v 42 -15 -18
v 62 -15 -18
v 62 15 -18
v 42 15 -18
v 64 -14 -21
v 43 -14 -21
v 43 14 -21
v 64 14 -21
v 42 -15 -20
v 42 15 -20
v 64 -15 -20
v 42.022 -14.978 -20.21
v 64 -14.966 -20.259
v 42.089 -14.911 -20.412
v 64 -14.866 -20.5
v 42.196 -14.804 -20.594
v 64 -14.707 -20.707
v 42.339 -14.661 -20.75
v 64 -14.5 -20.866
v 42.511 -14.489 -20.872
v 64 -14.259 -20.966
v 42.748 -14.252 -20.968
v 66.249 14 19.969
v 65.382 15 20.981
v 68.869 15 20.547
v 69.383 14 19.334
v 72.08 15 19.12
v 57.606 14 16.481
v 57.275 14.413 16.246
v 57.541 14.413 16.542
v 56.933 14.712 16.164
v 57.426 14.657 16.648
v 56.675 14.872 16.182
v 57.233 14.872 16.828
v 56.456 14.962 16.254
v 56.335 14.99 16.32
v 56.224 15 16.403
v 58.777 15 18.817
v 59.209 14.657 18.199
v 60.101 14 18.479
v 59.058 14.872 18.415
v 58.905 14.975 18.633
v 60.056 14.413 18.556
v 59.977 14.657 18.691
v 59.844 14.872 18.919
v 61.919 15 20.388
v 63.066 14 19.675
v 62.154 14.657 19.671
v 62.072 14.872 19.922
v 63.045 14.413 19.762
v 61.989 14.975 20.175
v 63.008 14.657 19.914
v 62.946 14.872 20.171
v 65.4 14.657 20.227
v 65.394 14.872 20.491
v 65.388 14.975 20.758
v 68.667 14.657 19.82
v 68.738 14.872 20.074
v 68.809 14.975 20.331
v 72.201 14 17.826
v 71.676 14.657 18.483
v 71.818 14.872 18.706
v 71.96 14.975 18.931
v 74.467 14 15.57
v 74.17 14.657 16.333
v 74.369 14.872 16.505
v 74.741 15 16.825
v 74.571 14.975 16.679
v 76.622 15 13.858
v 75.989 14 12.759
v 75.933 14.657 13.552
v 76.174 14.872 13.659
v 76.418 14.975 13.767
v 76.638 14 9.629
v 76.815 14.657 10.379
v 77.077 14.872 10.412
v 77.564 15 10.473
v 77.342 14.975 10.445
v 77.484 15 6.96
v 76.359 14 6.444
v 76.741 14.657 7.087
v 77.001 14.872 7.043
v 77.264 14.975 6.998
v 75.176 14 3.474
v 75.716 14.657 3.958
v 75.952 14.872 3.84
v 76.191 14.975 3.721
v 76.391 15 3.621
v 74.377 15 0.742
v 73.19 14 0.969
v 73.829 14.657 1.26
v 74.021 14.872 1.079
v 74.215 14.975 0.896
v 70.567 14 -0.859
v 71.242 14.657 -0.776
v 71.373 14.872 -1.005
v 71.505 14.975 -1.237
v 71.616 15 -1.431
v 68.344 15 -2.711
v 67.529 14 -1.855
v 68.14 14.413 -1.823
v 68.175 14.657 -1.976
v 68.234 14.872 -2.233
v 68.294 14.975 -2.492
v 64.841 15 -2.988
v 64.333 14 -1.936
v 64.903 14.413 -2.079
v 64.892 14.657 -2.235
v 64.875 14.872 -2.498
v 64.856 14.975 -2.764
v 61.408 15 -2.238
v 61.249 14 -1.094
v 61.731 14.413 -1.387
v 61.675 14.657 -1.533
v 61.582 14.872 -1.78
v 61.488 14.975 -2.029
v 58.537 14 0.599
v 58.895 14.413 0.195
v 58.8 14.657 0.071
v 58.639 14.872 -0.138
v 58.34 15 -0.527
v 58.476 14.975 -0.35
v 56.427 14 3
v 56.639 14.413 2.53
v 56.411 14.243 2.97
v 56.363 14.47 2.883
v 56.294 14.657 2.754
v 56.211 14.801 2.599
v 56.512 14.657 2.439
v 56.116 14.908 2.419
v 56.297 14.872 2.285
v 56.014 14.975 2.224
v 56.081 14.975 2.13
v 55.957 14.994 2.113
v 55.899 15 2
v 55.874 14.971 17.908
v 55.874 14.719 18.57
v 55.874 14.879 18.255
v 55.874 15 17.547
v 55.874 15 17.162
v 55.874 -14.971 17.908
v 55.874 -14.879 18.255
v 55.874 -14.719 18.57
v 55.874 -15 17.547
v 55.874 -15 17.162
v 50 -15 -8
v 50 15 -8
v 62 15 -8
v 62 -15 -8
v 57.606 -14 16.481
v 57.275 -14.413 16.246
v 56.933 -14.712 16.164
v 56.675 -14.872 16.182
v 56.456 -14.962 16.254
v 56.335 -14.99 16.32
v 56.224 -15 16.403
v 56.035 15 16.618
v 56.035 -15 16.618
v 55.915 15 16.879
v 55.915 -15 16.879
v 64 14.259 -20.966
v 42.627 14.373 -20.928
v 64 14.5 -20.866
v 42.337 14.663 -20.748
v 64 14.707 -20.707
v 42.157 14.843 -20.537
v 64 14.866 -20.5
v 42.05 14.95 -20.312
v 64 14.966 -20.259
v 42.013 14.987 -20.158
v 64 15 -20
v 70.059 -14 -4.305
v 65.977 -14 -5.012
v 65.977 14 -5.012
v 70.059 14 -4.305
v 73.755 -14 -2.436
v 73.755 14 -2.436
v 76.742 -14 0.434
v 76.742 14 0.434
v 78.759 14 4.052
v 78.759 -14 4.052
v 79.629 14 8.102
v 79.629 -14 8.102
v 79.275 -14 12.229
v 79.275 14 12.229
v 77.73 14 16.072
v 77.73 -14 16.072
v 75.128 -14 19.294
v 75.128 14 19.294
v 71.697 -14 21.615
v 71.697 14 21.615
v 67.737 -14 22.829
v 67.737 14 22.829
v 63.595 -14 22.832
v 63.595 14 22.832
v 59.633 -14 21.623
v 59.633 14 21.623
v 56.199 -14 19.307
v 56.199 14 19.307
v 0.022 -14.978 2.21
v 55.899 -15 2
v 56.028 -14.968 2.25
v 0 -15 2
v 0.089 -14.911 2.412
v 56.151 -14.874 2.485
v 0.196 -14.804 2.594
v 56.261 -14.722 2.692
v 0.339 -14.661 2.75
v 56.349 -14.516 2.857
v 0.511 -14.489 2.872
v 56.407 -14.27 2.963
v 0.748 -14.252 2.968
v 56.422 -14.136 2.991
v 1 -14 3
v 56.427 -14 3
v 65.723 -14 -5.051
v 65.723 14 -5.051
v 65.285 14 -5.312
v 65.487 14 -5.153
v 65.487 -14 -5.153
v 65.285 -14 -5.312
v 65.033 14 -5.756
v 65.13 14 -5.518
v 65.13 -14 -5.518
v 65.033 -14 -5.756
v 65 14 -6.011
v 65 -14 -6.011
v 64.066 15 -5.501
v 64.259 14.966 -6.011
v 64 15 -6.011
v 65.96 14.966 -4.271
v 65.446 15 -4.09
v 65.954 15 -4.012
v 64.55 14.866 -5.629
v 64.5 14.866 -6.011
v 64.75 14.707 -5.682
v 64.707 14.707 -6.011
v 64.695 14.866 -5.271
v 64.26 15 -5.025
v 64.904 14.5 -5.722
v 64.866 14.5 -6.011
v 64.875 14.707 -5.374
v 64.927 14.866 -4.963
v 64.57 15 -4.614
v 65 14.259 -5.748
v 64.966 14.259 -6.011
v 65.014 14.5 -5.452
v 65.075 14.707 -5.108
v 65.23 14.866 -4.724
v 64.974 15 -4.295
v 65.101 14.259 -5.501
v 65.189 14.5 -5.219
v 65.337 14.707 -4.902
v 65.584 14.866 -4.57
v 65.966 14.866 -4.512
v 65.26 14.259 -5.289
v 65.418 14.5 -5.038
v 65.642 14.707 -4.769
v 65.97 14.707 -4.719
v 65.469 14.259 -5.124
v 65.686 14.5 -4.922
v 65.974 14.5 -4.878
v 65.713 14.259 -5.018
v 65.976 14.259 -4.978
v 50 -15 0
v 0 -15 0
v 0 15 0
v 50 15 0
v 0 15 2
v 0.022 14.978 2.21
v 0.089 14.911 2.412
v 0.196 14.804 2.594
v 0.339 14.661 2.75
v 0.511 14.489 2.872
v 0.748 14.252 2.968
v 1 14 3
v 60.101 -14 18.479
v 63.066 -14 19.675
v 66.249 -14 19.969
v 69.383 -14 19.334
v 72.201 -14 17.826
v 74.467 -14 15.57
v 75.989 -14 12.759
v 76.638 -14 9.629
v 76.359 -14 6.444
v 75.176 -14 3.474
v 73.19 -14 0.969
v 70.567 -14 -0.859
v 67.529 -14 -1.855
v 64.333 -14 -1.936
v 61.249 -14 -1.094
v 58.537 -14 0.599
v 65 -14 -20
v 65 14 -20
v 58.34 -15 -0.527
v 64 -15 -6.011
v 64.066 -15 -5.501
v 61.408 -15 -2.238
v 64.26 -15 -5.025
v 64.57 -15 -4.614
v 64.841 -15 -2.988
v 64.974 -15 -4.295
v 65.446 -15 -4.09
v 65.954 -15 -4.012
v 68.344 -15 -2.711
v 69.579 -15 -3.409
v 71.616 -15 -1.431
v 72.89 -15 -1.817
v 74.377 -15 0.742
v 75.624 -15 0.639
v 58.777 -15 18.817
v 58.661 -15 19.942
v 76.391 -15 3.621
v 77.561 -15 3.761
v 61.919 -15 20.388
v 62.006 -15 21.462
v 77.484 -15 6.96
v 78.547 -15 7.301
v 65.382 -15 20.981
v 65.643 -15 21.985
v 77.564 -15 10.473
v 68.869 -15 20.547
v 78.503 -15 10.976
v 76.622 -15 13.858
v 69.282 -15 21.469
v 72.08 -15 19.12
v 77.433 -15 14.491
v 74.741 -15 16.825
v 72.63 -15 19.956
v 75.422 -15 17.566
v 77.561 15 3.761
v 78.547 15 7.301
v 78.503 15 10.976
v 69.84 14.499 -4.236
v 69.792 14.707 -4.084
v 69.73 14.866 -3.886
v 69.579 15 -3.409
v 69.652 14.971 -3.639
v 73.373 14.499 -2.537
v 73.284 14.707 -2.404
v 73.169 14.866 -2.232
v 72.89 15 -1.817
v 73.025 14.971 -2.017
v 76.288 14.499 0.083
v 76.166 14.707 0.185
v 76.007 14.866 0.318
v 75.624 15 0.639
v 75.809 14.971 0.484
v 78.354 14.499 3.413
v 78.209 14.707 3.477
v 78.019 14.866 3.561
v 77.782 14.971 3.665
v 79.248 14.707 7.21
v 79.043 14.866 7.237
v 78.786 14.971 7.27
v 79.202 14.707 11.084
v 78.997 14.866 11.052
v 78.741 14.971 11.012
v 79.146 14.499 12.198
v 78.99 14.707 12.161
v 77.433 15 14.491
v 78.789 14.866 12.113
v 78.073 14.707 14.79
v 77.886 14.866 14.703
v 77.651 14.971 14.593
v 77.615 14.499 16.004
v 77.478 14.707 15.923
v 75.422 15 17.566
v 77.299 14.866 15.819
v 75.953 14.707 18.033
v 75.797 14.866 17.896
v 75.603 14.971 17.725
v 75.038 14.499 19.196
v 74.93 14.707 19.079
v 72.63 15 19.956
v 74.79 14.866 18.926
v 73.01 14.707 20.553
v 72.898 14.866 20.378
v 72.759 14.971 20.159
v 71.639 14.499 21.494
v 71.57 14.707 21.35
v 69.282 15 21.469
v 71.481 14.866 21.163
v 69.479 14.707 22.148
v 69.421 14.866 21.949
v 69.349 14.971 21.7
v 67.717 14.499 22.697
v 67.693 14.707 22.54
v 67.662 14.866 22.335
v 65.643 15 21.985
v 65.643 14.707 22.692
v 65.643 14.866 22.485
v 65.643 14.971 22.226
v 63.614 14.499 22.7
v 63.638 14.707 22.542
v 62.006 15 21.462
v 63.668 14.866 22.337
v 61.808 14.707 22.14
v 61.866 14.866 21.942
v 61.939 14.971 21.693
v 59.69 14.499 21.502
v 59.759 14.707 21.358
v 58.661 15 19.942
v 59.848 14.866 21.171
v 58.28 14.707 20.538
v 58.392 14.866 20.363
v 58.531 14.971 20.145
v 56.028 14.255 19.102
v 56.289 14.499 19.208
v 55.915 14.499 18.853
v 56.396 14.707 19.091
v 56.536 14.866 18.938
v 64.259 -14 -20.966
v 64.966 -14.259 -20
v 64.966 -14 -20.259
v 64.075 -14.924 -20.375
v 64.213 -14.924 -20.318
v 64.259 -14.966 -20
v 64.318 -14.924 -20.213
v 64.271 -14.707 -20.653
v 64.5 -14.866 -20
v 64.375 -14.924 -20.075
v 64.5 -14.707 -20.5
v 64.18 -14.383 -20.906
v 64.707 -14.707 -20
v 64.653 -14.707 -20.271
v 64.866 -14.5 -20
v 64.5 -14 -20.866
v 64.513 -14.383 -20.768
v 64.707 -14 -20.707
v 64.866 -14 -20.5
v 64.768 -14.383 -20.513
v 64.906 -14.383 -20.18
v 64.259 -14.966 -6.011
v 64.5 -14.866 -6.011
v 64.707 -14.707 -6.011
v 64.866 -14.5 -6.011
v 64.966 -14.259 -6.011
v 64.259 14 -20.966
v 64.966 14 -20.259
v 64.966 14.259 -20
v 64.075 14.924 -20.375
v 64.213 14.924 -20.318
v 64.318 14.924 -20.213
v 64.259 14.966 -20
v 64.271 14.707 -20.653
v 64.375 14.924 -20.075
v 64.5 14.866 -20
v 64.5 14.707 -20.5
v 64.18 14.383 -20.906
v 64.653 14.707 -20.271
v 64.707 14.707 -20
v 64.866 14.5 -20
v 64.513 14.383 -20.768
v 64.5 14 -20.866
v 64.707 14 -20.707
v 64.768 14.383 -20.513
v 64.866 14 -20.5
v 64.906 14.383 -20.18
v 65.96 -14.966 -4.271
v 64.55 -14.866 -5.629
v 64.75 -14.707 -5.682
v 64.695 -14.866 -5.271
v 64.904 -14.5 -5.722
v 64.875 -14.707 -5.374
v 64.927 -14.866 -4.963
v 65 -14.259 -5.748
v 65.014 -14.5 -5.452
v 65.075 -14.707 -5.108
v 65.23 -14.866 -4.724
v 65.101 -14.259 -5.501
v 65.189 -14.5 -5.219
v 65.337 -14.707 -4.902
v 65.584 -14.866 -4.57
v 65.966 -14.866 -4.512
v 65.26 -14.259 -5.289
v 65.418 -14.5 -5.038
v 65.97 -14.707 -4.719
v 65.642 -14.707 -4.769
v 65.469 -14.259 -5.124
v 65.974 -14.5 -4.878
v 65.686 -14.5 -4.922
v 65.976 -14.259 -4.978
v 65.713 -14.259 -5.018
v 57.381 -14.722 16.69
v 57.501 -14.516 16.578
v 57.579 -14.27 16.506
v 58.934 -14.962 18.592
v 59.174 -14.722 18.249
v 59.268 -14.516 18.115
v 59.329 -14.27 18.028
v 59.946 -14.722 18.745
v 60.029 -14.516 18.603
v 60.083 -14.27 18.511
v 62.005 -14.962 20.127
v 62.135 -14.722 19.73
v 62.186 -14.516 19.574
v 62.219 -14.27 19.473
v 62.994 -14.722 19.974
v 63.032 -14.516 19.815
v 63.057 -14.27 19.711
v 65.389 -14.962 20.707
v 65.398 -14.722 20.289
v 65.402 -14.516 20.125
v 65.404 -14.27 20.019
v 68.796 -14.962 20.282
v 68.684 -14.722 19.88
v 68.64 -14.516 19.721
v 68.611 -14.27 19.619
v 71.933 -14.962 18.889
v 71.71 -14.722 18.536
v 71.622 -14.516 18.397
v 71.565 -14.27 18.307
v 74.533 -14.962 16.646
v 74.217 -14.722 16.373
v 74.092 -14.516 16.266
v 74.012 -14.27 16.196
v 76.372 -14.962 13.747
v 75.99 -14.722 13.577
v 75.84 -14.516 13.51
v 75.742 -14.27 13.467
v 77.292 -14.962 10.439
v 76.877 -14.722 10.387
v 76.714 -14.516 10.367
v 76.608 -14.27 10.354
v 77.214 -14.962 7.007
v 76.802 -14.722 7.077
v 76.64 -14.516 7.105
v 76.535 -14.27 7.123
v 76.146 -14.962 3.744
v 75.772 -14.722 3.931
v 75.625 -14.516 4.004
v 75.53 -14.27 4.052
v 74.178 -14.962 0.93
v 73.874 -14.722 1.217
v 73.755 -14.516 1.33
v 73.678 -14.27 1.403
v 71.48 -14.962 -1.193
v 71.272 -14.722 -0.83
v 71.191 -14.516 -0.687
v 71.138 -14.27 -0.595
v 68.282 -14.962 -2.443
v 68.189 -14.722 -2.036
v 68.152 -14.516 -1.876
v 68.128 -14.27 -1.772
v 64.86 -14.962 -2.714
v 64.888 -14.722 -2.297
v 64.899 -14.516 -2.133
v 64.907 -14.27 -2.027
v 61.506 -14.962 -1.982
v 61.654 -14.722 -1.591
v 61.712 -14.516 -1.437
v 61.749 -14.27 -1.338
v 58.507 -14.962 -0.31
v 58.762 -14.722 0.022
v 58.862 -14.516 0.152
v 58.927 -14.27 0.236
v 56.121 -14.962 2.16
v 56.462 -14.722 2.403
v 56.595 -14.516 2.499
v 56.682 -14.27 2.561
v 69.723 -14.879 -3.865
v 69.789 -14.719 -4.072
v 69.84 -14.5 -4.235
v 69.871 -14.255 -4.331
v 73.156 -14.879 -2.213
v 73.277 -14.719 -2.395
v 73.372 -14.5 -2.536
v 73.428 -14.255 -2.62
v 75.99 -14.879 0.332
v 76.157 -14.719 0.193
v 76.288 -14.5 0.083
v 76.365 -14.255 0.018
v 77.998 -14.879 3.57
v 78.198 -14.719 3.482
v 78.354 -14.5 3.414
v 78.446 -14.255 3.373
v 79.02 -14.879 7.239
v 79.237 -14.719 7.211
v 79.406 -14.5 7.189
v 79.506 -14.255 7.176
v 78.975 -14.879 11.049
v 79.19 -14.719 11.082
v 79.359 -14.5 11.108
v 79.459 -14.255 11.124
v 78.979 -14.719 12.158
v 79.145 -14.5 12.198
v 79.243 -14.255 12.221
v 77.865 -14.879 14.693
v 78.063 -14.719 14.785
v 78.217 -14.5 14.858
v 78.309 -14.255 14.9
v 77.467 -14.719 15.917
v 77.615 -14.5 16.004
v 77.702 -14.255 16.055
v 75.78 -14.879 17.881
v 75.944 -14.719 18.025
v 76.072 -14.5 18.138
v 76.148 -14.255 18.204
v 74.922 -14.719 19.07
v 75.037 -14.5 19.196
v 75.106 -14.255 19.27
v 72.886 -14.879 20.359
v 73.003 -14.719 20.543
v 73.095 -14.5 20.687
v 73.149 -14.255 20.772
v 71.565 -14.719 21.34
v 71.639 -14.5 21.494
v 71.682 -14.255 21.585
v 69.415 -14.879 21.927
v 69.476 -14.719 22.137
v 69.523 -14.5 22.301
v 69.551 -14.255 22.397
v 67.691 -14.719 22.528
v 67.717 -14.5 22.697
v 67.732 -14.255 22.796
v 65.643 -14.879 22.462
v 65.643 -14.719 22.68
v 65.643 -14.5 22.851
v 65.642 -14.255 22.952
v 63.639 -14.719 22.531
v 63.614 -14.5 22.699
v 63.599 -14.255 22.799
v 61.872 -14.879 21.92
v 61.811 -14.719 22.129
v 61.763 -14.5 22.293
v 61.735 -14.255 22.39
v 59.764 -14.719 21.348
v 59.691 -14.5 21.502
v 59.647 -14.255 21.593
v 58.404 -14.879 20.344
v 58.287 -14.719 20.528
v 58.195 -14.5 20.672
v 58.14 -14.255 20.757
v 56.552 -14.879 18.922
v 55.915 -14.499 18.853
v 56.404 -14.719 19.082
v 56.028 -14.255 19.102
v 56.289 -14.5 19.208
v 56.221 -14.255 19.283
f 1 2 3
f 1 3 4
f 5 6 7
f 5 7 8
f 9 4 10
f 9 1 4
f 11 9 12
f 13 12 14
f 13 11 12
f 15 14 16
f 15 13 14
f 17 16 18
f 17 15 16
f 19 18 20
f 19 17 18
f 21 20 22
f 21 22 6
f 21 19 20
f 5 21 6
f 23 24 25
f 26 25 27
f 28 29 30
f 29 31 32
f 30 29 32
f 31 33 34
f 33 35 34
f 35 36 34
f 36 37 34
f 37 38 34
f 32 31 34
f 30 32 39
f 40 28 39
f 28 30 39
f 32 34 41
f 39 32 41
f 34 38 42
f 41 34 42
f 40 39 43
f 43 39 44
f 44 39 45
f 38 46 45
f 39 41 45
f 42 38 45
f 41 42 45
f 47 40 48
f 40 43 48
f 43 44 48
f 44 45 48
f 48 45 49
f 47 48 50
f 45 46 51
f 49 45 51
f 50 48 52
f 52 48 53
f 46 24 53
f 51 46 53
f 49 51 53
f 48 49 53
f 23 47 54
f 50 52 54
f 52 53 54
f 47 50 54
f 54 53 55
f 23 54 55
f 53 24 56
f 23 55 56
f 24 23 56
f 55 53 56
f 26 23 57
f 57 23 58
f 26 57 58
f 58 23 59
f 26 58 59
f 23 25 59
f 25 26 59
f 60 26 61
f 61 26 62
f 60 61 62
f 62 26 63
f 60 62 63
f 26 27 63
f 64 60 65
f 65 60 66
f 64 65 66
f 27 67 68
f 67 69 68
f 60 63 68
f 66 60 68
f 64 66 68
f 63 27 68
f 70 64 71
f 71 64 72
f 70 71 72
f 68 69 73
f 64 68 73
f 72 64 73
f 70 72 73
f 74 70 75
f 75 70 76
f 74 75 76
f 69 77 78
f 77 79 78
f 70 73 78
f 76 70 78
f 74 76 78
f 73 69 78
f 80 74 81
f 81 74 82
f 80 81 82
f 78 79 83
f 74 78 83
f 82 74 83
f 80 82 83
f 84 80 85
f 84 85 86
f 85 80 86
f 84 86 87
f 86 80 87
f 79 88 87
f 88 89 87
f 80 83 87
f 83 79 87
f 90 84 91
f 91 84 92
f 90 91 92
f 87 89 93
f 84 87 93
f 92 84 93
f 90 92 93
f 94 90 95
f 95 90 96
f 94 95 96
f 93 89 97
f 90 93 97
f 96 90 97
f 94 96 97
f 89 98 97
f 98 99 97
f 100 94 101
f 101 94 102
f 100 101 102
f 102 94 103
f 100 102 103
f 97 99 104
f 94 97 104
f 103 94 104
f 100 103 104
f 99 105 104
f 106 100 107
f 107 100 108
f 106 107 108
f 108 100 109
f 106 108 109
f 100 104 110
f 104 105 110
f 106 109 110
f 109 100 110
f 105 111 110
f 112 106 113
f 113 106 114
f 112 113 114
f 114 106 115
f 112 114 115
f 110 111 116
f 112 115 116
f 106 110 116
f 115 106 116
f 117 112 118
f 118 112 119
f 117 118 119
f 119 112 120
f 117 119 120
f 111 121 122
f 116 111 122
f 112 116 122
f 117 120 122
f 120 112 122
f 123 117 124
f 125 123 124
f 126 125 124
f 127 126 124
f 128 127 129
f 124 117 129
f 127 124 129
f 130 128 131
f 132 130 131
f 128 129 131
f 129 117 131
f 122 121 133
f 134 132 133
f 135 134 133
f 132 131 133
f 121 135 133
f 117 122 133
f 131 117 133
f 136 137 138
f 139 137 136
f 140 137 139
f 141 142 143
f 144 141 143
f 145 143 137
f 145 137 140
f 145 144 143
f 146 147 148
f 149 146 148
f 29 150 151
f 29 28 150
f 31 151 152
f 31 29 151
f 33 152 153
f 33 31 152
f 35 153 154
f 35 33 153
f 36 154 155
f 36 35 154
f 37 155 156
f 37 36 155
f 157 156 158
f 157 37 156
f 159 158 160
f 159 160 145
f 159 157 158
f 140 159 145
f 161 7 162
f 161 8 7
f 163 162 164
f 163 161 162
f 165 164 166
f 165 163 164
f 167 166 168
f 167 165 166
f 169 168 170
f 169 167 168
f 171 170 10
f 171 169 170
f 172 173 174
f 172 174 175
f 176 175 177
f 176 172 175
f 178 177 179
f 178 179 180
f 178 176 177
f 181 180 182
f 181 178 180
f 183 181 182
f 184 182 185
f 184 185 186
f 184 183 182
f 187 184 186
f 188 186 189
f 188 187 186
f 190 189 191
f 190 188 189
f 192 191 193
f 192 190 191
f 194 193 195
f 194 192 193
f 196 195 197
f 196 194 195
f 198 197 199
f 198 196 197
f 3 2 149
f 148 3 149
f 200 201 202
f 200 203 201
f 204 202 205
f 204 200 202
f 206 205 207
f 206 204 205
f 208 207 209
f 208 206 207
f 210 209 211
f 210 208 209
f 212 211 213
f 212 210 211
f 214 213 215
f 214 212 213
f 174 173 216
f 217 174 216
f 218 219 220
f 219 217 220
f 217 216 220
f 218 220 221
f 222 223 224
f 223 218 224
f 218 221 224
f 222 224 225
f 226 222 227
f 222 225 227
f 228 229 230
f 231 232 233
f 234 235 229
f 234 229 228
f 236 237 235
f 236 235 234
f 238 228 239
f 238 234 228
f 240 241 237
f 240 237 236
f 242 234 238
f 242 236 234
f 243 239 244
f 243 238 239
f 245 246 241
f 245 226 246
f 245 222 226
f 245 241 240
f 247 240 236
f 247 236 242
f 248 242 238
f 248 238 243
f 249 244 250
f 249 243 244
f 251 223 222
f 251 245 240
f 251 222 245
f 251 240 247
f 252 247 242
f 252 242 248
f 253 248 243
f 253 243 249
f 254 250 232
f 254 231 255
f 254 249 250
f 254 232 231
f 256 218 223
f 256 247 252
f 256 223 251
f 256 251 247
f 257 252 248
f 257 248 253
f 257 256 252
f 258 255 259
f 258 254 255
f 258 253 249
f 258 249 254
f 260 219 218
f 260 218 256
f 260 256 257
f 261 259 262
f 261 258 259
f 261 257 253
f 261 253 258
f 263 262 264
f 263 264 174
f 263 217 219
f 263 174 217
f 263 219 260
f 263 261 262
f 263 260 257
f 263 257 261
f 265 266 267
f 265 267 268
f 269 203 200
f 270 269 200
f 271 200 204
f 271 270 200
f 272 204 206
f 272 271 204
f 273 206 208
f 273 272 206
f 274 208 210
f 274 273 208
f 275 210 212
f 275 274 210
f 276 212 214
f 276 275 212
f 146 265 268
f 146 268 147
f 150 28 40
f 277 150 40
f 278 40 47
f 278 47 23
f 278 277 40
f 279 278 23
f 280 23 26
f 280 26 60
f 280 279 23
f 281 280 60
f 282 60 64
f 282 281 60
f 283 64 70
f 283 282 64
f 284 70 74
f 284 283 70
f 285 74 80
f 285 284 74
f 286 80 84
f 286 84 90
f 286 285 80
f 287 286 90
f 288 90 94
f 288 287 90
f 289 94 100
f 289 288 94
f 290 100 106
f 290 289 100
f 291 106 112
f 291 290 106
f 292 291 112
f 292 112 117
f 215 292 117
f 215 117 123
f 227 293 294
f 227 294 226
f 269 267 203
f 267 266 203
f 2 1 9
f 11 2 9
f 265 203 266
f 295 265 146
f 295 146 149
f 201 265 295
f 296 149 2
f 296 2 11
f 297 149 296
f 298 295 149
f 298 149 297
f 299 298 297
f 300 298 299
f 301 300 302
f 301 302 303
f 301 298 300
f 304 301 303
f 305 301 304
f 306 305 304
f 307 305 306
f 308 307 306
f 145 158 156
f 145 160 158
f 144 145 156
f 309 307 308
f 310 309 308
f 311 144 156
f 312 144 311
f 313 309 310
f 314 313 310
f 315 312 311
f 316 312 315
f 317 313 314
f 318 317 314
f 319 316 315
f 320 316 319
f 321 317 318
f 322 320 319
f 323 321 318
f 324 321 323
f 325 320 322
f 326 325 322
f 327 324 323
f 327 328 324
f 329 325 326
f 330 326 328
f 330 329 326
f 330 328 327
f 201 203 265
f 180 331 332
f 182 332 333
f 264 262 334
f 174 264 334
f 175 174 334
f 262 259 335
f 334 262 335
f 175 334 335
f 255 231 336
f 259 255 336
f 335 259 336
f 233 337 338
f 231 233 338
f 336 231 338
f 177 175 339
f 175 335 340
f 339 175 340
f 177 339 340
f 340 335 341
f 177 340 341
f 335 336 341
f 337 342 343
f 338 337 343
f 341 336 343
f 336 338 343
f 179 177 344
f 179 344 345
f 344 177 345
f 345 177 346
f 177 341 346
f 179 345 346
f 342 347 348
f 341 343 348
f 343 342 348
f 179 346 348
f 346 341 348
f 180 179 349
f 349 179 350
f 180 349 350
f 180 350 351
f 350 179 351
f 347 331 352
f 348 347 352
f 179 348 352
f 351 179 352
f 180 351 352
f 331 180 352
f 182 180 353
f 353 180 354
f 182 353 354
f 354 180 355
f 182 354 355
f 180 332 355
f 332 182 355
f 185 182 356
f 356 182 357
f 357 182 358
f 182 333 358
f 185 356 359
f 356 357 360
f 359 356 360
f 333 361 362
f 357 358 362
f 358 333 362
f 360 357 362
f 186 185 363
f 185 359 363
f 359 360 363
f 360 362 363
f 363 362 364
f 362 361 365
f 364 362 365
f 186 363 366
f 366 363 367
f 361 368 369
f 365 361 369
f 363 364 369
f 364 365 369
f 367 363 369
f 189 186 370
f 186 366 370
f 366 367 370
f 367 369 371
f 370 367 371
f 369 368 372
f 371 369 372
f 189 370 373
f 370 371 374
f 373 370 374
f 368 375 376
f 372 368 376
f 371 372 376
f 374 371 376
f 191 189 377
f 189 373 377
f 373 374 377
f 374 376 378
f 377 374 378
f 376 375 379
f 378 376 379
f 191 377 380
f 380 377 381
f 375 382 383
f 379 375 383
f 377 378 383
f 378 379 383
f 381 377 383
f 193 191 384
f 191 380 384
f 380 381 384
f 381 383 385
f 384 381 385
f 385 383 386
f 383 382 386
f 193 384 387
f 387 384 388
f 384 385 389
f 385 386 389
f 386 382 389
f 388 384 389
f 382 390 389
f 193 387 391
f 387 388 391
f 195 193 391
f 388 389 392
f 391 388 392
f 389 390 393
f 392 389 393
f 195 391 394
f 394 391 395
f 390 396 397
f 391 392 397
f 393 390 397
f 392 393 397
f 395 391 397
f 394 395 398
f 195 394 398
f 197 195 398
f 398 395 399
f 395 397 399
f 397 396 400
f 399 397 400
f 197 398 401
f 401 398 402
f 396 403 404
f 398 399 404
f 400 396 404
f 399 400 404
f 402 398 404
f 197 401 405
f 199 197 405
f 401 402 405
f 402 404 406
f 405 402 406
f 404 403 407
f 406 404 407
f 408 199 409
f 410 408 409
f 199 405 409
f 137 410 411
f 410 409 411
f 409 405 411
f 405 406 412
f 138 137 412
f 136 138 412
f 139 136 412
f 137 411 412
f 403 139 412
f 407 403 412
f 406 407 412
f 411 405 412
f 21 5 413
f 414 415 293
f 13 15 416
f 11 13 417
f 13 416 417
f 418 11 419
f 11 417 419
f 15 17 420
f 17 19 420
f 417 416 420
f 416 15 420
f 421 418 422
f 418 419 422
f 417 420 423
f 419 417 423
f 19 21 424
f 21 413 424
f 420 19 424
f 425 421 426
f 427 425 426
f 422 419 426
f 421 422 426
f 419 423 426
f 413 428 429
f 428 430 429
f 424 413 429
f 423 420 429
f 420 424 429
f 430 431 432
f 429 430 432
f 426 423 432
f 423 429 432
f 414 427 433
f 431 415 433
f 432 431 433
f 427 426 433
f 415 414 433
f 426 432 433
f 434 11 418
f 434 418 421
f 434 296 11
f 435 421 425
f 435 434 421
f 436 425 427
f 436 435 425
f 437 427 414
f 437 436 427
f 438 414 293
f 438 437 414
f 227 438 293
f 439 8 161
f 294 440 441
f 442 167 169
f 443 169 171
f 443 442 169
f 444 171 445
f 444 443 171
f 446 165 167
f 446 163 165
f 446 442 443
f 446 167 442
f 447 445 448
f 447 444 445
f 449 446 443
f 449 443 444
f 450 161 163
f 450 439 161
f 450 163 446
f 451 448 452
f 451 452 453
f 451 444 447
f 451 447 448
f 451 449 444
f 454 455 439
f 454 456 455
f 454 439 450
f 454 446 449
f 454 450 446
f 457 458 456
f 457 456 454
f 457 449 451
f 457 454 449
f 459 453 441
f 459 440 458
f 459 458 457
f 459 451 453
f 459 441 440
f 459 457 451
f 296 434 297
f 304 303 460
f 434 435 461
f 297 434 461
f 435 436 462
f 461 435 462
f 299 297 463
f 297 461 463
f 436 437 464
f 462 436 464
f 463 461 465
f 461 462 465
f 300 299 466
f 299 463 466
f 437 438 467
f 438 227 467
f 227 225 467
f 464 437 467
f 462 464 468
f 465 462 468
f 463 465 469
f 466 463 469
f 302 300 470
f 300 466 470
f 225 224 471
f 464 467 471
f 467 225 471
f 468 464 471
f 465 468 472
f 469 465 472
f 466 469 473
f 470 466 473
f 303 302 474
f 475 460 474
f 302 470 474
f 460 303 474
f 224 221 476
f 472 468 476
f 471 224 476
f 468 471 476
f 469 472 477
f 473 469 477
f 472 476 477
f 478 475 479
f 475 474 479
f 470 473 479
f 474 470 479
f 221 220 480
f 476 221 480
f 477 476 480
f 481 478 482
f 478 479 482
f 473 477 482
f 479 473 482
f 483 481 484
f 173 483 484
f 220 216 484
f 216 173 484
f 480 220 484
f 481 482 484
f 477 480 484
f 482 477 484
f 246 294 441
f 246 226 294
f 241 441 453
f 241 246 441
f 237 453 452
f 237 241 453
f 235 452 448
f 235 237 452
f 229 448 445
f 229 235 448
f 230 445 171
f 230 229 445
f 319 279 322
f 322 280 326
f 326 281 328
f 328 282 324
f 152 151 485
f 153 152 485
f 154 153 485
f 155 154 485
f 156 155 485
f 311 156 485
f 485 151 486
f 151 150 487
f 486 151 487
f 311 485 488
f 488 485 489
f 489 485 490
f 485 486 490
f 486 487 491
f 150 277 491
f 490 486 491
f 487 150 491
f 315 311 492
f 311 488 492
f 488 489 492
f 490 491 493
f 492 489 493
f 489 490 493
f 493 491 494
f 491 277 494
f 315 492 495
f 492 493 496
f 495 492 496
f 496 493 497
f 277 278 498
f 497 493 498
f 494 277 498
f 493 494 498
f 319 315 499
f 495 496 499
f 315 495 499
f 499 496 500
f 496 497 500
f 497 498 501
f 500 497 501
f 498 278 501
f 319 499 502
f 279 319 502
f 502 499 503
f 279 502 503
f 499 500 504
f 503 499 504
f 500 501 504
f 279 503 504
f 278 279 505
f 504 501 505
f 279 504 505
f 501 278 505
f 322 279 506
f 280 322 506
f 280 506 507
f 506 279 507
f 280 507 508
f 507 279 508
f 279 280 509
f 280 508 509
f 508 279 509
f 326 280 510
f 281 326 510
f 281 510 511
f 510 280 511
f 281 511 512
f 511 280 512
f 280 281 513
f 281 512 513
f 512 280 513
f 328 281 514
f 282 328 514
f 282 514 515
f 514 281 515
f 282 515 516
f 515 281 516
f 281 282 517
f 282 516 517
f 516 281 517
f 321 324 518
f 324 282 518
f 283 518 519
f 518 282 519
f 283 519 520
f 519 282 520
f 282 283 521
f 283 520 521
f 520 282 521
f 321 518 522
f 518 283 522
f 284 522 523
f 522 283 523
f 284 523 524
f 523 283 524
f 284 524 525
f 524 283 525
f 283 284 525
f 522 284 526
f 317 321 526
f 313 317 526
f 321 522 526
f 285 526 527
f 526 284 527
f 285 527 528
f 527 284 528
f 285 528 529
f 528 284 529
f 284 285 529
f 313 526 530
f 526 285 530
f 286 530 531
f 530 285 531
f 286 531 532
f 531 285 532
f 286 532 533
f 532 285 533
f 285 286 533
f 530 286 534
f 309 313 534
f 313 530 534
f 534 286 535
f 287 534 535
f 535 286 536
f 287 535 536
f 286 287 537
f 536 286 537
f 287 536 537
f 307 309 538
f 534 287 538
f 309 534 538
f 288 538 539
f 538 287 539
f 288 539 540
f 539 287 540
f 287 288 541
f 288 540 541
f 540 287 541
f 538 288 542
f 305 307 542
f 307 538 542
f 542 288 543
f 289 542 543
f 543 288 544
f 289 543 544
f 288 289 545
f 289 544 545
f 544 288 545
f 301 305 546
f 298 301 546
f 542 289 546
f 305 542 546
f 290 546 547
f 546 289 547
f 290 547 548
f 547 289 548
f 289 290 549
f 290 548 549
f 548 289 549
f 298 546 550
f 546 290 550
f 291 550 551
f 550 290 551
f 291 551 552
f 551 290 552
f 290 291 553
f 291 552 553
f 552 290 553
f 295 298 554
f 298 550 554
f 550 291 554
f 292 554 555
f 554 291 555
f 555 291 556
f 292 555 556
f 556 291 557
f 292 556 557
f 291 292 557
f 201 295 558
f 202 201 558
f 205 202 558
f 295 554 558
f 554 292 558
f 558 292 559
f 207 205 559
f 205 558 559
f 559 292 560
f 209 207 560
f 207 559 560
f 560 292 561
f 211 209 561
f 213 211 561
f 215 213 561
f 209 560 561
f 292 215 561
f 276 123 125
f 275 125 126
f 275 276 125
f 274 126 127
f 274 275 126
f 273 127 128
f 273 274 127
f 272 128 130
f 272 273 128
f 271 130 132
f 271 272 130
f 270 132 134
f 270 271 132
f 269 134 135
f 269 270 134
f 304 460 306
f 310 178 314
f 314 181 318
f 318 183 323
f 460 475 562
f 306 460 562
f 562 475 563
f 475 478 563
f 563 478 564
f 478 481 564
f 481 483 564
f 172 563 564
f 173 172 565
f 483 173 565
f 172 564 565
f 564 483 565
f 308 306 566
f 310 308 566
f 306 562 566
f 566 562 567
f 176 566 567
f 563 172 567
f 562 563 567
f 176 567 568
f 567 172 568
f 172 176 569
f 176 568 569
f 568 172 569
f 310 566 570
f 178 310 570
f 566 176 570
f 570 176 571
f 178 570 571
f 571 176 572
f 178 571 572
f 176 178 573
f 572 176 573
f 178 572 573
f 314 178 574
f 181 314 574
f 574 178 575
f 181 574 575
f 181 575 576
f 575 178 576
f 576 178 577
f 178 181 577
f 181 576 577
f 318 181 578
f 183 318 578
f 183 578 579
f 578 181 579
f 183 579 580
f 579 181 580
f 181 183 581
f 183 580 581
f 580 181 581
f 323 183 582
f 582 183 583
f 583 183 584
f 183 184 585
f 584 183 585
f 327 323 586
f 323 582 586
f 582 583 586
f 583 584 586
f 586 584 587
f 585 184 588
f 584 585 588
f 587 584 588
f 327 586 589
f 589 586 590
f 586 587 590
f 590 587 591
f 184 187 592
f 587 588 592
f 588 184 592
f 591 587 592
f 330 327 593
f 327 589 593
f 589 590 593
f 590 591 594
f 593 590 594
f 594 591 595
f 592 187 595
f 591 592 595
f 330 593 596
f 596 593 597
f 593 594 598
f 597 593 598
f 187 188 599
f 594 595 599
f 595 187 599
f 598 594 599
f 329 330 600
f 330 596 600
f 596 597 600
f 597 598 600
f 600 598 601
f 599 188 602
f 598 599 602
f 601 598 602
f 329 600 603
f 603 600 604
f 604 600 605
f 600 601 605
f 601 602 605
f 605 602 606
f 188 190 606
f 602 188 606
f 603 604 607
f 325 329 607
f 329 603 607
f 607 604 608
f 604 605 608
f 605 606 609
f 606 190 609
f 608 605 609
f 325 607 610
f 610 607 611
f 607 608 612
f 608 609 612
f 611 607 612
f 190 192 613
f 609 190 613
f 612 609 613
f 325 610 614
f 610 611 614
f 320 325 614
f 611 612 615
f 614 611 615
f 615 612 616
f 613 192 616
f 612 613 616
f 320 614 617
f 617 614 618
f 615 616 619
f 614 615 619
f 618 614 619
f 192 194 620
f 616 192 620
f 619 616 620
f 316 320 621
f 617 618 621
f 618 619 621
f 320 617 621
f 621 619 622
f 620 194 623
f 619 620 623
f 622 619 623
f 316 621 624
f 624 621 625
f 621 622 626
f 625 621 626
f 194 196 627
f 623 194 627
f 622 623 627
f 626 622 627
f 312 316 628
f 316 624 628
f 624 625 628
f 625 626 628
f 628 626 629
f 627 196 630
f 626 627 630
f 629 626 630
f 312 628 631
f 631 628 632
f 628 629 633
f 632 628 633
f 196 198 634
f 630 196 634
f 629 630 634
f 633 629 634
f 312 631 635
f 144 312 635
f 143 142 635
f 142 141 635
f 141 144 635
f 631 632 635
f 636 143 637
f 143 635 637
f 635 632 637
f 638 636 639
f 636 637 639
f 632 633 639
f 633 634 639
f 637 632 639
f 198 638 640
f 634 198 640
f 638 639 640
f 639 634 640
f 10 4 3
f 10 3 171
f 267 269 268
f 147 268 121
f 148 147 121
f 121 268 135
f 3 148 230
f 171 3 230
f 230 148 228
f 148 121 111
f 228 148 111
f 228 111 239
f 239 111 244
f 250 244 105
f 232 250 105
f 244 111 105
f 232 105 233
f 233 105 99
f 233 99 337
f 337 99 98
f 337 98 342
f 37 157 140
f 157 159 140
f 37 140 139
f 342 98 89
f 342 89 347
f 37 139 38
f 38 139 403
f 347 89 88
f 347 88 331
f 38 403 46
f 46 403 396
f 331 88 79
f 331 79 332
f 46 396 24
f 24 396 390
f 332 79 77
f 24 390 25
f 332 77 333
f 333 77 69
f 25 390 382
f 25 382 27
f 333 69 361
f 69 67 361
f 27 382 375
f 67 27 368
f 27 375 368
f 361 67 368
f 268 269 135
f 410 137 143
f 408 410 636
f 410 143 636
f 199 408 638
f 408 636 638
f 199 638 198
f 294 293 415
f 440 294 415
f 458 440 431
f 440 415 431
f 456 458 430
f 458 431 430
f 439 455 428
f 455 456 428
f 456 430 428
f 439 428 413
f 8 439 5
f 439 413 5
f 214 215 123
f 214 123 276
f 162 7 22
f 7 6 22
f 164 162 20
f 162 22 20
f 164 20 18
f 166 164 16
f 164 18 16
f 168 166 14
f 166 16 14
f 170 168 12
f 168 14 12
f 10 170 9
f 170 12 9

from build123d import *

# Parameters (mm, degrees)
F0_W          = 50
F0_H          = 3
F0_W_2        = 3
F0_W_3        = 9
F0_H_2        = 10
F1_DEPTH      = 15
F1_DEPTH_BACK = 15
F2_R          = 1


with BuildPart() as f1:
    # F0 (on Front) → F1 (new body, two sides)
    with BuildSketch(Plane.XZ) as f1_sk:
        with Locations((25, 1.5)):
            Rectangle(F0_W, F0_H)
        Polygon((50, 3), (50, 0), (50, -5), (53, -5), (53, 3), align=None)
        with Locations((51.5, -6.5)):
            Rectangle(F0_W_2, F0_H)
        with BuildLine():
            ThreePointArc((65, -5), (57.8905996075, -2.6641005887), (53, 3))
            Line((53, 3), (53, -5))
            Line((53, -5), (62, -5))
            Line((62, -5), (65, -5))
        make_face()
        with BuildLine():
            Line((55.8741820756, 3), (53, 3))
            ThreePointArc((53, 3), (57.8905996075, -2.6641005887), (65, -5))
            ThreePointArc((65, -5), (78.7423188539, 13.9604240048), (55.8741820756, 19))
            Line((55.8741820756, 19), (55.8741820756, 14.0153257874))
            ThreePointArc((55.8741820756, 14.0153257874), (76.6425830118, 9.5358154417), (56.4268562898, 3))
            Line((56.4268562898, 3), (55.8741820756, 3))
        make_face()
        with Locations((57.5, -6.5)):
            Rectangle(F0_W_3, F0_H)
        with Locations((63.5, -6.5)):
            Rectangle(F0_W_2, F0_H)
        with Locations((63.5, -13)):
            Rectangle(F0_W_2, F0_H_2)
        Polygon((65, -21), (65, -18), (62, -18), (42, -18), (42, -21), align=None)
    extrude(amount=F1_DEPTH)
    extrude(f1_sk.sketch, amount=-F1_DEPTH_BACK)

    # F2
    f2_edges = [f1.edges().sort_by_distance(p)[0] for p in [
        (55.874182, 0, 14.015326),
        (65, 0, -21),
        (0, 0, 3),
        (78.742319, -15, 13.960424),
        (55.874182, 0, 19),
        (78.742319, 15, 13.960424),
        (65, 0, -5),
        (28.213428, 15, 3),
        (28.213428, -15, 3),
        (76.642583, -15, 9.535815),
        (76.642583, 15, 9.535815),
        (53.5, -15, -21),
        (53.5, 15, -21),
        (42, 0, -21),
        (65, 15, -13),
        (65, -15, -13),
    ]]
    fillet(f2_edges, radius=F2_R)


solid = f1.part
